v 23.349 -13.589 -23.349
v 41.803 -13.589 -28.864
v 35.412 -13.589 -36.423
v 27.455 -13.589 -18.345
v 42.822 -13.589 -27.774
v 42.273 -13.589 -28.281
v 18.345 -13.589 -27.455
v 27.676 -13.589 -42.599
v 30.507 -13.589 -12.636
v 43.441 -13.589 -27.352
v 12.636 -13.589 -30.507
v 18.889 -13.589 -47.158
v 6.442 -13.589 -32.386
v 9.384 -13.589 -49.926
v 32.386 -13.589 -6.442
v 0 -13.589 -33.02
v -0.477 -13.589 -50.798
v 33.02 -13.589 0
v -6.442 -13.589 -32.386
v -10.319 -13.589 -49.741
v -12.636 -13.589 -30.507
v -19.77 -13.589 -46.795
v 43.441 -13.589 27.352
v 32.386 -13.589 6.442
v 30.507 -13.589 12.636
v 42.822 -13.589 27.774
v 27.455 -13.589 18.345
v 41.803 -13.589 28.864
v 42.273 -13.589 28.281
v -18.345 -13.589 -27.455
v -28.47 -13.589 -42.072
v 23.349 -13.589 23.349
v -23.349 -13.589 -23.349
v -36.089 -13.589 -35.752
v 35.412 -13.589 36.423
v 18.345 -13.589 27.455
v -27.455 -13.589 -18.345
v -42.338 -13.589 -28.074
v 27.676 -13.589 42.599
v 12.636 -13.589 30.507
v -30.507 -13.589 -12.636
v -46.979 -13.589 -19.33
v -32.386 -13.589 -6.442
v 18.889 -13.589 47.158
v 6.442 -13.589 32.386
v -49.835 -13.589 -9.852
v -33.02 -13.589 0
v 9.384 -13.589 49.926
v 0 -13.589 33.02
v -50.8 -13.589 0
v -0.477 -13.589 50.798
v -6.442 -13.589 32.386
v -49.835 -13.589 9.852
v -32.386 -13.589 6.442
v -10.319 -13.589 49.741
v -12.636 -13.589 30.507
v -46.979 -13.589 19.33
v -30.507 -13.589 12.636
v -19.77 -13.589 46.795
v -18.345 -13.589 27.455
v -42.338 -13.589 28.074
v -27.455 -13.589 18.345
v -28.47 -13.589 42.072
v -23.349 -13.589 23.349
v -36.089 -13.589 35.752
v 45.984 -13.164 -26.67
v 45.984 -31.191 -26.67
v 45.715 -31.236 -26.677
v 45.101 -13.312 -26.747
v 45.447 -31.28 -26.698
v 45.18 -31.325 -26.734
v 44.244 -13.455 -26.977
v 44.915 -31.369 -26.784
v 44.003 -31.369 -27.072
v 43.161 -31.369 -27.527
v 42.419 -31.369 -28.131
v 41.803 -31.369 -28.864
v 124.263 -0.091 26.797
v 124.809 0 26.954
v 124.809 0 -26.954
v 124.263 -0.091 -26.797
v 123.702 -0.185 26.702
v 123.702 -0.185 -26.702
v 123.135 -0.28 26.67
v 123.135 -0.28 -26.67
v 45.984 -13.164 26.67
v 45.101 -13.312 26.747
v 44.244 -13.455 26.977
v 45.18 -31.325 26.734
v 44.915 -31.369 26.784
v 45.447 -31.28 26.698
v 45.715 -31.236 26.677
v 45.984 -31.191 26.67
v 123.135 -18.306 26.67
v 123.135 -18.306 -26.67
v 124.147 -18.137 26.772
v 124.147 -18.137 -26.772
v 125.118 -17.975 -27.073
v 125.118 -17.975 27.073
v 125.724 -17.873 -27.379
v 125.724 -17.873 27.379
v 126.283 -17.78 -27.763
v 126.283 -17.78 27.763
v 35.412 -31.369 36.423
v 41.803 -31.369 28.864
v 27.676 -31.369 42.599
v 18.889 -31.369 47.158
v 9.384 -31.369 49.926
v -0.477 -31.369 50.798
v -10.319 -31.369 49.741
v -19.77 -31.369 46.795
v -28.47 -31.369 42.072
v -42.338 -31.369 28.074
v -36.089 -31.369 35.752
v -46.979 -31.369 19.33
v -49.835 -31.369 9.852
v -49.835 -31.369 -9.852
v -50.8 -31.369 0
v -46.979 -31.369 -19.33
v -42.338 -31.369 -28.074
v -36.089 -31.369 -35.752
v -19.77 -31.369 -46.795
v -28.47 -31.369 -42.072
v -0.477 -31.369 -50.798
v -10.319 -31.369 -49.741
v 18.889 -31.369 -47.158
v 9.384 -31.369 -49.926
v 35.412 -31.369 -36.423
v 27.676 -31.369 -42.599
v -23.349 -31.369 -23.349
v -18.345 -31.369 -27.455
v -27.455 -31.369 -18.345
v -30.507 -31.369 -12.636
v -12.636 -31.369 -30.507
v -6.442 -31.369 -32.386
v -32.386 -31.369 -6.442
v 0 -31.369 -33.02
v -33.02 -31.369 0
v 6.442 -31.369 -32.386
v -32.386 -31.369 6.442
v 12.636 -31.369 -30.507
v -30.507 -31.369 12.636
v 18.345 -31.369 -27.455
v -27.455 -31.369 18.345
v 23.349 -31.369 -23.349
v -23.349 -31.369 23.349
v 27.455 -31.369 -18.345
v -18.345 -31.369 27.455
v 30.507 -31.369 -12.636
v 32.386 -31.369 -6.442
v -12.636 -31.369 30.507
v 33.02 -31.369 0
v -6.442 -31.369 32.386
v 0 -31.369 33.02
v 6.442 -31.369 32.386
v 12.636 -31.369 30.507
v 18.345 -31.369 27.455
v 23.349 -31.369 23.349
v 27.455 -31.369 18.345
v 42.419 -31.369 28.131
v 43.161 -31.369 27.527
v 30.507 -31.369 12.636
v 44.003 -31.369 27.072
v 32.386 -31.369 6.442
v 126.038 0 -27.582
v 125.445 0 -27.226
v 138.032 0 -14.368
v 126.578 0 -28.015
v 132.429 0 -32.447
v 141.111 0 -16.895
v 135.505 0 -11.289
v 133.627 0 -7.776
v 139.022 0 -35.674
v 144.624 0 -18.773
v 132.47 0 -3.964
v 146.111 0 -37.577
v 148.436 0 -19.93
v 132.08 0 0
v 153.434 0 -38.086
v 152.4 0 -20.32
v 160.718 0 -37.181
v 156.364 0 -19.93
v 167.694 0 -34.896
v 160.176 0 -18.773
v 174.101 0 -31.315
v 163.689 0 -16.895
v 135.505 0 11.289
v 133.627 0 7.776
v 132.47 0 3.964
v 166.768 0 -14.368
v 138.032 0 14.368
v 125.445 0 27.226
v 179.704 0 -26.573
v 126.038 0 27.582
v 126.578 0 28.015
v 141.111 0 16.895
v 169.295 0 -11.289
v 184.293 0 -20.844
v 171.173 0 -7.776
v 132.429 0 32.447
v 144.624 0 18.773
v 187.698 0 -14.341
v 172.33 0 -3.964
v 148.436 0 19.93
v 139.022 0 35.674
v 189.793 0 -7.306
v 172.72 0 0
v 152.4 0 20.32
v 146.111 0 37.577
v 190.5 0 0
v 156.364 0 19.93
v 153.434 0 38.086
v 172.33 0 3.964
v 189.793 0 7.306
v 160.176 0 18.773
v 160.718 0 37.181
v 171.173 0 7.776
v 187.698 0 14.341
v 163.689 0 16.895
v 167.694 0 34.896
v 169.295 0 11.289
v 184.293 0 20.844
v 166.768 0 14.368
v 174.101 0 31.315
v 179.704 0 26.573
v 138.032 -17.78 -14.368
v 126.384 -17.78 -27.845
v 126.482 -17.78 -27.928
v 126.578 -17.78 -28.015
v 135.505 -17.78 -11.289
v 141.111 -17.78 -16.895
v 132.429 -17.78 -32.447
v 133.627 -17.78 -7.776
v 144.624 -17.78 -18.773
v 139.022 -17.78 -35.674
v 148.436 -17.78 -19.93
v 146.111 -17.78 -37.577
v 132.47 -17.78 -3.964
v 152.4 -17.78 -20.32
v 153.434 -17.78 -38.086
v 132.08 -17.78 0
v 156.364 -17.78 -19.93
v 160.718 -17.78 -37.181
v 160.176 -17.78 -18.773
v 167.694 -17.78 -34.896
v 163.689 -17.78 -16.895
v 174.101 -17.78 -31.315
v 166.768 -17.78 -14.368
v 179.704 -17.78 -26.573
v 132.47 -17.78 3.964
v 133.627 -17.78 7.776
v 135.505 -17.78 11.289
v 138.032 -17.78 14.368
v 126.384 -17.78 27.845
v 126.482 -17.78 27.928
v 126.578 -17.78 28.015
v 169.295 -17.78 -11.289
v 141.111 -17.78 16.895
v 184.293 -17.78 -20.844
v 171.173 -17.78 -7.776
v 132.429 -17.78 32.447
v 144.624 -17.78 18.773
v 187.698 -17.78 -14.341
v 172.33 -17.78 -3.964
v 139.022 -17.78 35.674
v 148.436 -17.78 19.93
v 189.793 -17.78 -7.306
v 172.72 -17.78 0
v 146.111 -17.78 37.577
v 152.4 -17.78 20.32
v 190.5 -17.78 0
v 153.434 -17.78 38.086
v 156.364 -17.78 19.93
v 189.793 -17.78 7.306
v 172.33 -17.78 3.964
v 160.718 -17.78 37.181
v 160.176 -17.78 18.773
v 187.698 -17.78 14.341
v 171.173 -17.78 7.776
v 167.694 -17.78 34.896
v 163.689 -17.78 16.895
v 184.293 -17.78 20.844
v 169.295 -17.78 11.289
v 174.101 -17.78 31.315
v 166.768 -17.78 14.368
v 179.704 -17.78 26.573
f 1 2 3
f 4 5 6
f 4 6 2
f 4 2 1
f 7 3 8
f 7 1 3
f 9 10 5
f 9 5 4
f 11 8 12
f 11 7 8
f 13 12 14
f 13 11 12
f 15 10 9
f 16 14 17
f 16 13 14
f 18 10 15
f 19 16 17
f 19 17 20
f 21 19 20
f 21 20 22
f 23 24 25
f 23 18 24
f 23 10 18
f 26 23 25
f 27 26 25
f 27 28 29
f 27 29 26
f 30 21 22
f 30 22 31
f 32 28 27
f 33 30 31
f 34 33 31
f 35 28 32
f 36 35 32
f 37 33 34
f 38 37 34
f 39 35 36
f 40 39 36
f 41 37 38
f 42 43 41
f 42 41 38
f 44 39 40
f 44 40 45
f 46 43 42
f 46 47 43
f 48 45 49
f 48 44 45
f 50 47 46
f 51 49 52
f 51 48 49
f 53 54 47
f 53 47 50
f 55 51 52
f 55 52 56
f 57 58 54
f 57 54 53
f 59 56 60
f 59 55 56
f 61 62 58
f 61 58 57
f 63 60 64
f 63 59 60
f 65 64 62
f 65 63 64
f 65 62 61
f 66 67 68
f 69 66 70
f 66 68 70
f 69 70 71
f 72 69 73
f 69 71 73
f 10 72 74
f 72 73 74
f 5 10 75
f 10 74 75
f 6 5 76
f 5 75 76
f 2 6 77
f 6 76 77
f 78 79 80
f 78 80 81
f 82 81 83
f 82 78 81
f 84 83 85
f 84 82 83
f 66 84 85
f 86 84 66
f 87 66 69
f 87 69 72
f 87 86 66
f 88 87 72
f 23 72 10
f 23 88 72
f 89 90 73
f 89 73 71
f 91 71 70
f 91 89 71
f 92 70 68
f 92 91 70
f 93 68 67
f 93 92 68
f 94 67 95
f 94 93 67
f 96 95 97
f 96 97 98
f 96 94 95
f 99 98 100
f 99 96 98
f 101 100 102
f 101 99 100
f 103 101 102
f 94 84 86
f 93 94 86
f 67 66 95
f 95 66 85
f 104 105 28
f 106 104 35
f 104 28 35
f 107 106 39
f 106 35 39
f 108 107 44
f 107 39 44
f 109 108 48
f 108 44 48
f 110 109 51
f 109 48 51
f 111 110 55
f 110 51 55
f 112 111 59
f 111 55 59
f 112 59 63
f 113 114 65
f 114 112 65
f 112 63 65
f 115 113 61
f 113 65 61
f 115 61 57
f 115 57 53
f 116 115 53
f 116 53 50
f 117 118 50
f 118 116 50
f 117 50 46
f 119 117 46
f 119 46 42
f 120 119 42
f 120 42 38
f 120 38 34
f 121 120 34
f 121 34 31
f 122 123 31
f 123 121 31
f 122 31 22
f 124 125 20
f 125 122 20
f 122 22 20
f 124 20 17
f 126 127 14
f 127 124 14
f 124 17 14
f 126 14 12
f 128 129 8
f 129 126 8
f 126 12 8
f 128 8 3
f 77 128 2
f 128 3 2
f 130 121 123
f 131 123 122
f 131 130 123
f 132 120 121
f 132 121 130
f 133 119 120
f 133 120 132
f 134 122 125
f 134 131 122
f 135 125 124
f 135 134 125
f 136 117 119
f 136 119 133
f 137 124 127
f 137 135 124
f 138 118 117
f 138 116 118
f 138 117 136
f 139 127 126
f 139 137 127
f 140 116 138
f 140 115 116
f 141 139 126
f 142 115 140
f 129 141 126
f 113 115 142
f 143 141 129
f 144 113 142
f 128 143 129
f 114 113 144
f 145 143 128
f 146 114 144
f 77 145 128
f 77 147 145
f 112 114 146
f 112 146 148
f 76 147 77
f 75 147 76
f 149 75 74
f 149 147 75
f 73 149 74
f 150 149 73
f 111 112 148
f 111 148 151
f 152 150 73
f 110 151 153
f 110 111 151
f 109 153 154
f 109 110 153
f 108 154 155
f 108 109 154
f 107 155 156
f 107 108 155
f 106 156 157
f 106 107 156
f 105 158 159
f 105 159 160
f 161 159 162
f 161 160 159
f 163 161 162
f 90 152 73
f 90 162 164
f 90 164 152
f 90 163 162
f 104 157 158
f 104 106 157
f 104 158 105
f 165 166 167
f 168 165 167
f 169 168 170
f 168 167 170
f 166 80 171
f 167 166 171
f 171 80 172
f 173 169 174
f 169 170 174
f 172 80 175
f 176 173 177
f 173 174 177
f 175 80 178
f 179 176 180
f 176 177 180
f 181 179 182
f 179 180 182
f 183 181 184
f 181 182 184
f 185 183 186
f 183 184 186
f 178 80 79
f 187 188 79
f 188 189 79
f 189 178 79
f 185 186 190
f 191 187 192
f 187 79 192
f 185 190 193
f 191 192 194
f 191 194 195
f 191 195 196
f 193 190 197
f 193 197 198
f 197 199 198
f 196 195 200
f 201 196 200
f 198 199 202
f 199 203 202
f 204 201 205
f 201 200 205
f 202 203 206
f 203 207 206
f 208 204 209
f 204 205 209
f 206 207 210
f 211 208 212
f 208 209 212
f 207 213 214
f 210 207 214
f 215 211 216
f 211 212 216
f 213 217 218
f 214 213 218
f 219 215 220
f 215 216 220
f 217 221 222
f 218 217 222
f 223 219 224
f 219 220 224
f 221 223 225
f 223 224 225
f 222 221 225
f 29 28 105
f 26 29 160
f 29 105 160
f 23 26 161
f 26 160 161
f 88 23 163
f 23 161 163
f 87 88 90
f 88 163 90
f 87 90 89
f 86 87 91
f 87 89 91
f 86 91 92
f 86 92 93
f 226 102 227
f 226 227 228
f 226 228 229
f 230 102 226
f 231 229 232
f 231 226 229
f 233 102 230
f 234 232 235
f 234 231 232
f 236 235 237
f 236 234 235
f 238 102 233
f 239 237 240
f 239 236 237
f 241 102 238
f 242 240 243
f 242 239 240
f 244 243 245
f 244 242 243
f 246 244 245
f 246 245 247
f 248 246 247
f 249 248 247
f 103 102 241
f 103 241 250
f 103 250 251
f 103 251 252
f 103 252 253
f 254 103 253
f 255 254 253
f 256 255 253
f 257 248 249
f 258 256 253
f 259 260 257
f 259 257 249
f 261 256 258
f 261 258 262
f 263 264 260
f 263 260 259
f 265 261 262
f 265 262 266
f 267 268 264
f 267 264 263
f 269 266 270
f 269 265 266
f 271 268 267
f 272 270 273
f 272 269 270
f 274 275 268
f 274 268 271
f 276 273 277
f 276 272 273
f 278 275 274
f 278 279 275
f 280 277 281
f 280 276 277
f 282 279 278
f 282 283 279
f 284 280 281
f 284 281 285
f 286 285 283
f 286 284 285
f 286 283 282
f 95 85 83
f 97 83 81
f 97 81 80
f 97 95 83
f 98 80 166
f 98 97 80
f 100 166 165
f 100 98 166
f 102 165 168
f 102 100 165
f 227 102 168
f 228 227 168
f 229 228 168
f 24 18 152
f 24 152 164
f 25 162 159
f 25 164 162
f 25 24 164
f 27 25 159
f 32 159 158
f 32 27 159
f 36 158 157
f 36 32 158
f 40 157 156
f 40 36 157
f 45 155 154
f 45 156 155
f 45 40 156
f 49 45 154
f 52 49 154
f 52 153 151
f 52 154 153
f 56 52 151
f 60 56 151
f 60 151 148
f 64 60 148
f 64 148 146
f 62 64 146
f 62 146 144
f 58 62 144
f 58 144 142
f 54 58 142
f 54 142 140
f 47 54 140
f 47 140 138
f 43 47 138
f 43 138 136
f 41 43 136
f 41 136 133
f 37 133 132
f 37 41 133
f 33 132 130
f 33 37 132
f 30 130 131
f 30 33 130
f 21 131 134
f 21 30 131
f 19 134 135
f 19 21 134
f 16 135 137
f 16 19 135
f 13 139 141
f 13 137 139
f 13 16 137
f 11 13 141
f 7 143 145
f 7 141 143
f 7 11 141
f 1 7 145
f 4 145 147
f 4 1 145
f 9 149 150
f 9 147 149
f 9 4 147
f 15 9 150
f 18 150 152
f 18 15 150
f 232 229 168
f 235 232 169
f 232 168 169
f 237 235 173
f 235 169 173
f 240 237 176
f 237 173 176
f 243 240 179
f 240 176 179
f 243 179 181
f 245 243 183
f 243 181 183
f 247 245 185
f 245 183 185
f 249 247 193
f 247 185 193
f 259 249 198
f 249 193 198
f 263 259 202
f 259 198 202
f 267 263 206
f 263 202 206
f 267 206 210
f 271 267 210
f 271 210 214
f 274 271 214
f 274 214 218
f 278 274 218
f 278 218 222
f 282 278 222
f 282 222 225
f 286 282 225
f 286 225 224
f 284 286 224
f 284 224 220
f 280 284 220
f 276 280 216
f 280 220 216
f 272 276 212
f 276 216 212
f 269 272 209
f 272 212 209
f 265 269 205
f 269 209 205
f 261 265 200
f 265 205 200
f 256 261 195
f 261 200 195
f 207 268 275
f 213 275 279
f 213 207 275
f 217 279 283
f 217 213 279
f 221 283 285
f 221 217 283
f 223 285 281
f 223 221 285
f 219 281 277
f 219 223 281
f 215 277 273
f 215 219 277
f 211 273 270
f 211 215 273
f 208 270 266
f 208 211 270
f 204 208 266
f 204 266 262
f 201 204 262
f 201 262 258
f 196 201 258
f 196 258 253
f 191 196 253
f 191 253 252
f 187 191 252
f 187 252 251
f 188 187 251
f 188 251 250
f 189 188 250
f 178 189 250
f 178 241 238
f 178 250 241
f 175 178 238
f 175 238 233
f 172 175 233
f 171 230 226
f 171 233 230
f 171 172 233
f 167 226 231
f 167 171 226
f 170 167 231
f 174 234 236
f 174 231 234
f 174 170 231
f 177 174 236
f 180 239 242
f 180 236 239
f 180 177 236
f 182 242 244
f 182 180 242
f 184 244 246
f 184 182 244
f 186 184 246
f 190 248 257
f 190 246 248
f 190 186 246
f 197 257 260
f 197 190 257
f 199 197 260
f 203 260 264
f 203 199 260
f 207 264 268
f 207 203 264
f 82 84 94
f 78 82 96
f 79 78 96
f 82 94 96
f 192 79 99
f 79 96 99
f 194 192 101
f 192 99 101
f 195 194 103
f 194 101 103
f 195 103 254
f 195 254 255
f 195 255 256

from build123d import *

# Parameters (mm, degrees)
F0_R     = 33.02
F0_R_2   = 20.32
F1_DEPTH = 50.8
F3_DEPTH = 50.8
F4_R     = 5.08
F5_R     = 5.08
F6_R     = 5.08
F7_R     = 5.08


with BuildPart() as f1:
    # F0 (on Front) → F1 (new body)
    with BuildSketch(Plane.XZ):
        with BuildLine():
            ThreePointArc((43.2359931076, -26.67), (48.8724280646, -13.8609442343), (50.8, 0))
            ThreePointArc((50.8, 0), (48.8724280646, 13.8609442343), (43.2359931076, 26.67))
            ThreePointArc((43.2359931076, 26.67), (-50.8, 0), (43.2359931076, -26.67))
        make_face()
        Circle(F0_R, mode=Mode.SUBTRACT)
        with BuildLine():
            ThreePointArc((43.2359931076, 26.67), (48.8724280646, 13.8609442343), (50.8, 0))
            ThreePointArc((50.8, 0), (48.8724280646, -13.8609442343), (43.2359931076, -26.67))
            Line((43.2359931076, -26.67), (125.1911576873, -26.67))
            ThreePointArc((125.1911576873, -26.67), (114.3, 0), (125.1911576873, 26.67))
            Line((125.1911576873, 26.67), (43.2359931076, 26.67))
        make_face()
        with BuildLine():
            ThreePointArc((190.5, 0), (166.8040464433, 35.2722758843), (125.1911576873, 26.67))
            ThreePointArc((125.1911576873, 26.67), (114.3, 0), (125.1911576873, -26.67))
            ThreePointArc((125.1911576873, -26.67), (166.8040464433, -35.2722758843), (190.5, 0))
        make_face()
        with Locations((152.4, 0)):
            Circle(F0_R_2, mode=Mode.SUBTRACT)
    extrude(amount=F1_DEPTH)

    # F2 (on Top) → F3 (intersect, symmetric)
    with BuildSketch(Plane.XY):
        Polygon((213.7089745641, -17.78), (213.7089745641, 0), (124.8089745641, 0), (43.4407666326, -13.5890487581), (-83.5592333674, -13.5890487581), (-83.5592333674, -31.3690487581), (44.915247018, -31.3690487581), (126.2834549495, -17.78), align=None)
    extrude(amount=F3_DEPTH, both=True, mode=Mode.INTERSECT)

    # F4
    f4_edges = [f1.edges().sort_by_distance(p)[0] for p in [
        (43.235993, -22.479049, 26.67),
    ]]
    fillet(f4_edges, radius=F4_R)

    # F5
    f5_edges = [f1.edges().sort_by_distance(p)[0] for p in [
        (125.191158, -8.981211, 26.67),
    ]]
    fillet(f5_edges, radius=F5_R)

    # F6
    f6_edges = [f1.edges().sort_by_distance(p)[0] for p in [
        (43.235993, -22.479049, -26.67),
    ]]
    fillet(f6_edges, radius=F6_R)

    # F7
    f7_edges = [f1.edges().sort_by_distance(p)[0] for p in [
        (125.191158, -8.981211, -26.67),
    ]]
    fillet(f7_edges, radius=F7_R)


solid = f1.part
